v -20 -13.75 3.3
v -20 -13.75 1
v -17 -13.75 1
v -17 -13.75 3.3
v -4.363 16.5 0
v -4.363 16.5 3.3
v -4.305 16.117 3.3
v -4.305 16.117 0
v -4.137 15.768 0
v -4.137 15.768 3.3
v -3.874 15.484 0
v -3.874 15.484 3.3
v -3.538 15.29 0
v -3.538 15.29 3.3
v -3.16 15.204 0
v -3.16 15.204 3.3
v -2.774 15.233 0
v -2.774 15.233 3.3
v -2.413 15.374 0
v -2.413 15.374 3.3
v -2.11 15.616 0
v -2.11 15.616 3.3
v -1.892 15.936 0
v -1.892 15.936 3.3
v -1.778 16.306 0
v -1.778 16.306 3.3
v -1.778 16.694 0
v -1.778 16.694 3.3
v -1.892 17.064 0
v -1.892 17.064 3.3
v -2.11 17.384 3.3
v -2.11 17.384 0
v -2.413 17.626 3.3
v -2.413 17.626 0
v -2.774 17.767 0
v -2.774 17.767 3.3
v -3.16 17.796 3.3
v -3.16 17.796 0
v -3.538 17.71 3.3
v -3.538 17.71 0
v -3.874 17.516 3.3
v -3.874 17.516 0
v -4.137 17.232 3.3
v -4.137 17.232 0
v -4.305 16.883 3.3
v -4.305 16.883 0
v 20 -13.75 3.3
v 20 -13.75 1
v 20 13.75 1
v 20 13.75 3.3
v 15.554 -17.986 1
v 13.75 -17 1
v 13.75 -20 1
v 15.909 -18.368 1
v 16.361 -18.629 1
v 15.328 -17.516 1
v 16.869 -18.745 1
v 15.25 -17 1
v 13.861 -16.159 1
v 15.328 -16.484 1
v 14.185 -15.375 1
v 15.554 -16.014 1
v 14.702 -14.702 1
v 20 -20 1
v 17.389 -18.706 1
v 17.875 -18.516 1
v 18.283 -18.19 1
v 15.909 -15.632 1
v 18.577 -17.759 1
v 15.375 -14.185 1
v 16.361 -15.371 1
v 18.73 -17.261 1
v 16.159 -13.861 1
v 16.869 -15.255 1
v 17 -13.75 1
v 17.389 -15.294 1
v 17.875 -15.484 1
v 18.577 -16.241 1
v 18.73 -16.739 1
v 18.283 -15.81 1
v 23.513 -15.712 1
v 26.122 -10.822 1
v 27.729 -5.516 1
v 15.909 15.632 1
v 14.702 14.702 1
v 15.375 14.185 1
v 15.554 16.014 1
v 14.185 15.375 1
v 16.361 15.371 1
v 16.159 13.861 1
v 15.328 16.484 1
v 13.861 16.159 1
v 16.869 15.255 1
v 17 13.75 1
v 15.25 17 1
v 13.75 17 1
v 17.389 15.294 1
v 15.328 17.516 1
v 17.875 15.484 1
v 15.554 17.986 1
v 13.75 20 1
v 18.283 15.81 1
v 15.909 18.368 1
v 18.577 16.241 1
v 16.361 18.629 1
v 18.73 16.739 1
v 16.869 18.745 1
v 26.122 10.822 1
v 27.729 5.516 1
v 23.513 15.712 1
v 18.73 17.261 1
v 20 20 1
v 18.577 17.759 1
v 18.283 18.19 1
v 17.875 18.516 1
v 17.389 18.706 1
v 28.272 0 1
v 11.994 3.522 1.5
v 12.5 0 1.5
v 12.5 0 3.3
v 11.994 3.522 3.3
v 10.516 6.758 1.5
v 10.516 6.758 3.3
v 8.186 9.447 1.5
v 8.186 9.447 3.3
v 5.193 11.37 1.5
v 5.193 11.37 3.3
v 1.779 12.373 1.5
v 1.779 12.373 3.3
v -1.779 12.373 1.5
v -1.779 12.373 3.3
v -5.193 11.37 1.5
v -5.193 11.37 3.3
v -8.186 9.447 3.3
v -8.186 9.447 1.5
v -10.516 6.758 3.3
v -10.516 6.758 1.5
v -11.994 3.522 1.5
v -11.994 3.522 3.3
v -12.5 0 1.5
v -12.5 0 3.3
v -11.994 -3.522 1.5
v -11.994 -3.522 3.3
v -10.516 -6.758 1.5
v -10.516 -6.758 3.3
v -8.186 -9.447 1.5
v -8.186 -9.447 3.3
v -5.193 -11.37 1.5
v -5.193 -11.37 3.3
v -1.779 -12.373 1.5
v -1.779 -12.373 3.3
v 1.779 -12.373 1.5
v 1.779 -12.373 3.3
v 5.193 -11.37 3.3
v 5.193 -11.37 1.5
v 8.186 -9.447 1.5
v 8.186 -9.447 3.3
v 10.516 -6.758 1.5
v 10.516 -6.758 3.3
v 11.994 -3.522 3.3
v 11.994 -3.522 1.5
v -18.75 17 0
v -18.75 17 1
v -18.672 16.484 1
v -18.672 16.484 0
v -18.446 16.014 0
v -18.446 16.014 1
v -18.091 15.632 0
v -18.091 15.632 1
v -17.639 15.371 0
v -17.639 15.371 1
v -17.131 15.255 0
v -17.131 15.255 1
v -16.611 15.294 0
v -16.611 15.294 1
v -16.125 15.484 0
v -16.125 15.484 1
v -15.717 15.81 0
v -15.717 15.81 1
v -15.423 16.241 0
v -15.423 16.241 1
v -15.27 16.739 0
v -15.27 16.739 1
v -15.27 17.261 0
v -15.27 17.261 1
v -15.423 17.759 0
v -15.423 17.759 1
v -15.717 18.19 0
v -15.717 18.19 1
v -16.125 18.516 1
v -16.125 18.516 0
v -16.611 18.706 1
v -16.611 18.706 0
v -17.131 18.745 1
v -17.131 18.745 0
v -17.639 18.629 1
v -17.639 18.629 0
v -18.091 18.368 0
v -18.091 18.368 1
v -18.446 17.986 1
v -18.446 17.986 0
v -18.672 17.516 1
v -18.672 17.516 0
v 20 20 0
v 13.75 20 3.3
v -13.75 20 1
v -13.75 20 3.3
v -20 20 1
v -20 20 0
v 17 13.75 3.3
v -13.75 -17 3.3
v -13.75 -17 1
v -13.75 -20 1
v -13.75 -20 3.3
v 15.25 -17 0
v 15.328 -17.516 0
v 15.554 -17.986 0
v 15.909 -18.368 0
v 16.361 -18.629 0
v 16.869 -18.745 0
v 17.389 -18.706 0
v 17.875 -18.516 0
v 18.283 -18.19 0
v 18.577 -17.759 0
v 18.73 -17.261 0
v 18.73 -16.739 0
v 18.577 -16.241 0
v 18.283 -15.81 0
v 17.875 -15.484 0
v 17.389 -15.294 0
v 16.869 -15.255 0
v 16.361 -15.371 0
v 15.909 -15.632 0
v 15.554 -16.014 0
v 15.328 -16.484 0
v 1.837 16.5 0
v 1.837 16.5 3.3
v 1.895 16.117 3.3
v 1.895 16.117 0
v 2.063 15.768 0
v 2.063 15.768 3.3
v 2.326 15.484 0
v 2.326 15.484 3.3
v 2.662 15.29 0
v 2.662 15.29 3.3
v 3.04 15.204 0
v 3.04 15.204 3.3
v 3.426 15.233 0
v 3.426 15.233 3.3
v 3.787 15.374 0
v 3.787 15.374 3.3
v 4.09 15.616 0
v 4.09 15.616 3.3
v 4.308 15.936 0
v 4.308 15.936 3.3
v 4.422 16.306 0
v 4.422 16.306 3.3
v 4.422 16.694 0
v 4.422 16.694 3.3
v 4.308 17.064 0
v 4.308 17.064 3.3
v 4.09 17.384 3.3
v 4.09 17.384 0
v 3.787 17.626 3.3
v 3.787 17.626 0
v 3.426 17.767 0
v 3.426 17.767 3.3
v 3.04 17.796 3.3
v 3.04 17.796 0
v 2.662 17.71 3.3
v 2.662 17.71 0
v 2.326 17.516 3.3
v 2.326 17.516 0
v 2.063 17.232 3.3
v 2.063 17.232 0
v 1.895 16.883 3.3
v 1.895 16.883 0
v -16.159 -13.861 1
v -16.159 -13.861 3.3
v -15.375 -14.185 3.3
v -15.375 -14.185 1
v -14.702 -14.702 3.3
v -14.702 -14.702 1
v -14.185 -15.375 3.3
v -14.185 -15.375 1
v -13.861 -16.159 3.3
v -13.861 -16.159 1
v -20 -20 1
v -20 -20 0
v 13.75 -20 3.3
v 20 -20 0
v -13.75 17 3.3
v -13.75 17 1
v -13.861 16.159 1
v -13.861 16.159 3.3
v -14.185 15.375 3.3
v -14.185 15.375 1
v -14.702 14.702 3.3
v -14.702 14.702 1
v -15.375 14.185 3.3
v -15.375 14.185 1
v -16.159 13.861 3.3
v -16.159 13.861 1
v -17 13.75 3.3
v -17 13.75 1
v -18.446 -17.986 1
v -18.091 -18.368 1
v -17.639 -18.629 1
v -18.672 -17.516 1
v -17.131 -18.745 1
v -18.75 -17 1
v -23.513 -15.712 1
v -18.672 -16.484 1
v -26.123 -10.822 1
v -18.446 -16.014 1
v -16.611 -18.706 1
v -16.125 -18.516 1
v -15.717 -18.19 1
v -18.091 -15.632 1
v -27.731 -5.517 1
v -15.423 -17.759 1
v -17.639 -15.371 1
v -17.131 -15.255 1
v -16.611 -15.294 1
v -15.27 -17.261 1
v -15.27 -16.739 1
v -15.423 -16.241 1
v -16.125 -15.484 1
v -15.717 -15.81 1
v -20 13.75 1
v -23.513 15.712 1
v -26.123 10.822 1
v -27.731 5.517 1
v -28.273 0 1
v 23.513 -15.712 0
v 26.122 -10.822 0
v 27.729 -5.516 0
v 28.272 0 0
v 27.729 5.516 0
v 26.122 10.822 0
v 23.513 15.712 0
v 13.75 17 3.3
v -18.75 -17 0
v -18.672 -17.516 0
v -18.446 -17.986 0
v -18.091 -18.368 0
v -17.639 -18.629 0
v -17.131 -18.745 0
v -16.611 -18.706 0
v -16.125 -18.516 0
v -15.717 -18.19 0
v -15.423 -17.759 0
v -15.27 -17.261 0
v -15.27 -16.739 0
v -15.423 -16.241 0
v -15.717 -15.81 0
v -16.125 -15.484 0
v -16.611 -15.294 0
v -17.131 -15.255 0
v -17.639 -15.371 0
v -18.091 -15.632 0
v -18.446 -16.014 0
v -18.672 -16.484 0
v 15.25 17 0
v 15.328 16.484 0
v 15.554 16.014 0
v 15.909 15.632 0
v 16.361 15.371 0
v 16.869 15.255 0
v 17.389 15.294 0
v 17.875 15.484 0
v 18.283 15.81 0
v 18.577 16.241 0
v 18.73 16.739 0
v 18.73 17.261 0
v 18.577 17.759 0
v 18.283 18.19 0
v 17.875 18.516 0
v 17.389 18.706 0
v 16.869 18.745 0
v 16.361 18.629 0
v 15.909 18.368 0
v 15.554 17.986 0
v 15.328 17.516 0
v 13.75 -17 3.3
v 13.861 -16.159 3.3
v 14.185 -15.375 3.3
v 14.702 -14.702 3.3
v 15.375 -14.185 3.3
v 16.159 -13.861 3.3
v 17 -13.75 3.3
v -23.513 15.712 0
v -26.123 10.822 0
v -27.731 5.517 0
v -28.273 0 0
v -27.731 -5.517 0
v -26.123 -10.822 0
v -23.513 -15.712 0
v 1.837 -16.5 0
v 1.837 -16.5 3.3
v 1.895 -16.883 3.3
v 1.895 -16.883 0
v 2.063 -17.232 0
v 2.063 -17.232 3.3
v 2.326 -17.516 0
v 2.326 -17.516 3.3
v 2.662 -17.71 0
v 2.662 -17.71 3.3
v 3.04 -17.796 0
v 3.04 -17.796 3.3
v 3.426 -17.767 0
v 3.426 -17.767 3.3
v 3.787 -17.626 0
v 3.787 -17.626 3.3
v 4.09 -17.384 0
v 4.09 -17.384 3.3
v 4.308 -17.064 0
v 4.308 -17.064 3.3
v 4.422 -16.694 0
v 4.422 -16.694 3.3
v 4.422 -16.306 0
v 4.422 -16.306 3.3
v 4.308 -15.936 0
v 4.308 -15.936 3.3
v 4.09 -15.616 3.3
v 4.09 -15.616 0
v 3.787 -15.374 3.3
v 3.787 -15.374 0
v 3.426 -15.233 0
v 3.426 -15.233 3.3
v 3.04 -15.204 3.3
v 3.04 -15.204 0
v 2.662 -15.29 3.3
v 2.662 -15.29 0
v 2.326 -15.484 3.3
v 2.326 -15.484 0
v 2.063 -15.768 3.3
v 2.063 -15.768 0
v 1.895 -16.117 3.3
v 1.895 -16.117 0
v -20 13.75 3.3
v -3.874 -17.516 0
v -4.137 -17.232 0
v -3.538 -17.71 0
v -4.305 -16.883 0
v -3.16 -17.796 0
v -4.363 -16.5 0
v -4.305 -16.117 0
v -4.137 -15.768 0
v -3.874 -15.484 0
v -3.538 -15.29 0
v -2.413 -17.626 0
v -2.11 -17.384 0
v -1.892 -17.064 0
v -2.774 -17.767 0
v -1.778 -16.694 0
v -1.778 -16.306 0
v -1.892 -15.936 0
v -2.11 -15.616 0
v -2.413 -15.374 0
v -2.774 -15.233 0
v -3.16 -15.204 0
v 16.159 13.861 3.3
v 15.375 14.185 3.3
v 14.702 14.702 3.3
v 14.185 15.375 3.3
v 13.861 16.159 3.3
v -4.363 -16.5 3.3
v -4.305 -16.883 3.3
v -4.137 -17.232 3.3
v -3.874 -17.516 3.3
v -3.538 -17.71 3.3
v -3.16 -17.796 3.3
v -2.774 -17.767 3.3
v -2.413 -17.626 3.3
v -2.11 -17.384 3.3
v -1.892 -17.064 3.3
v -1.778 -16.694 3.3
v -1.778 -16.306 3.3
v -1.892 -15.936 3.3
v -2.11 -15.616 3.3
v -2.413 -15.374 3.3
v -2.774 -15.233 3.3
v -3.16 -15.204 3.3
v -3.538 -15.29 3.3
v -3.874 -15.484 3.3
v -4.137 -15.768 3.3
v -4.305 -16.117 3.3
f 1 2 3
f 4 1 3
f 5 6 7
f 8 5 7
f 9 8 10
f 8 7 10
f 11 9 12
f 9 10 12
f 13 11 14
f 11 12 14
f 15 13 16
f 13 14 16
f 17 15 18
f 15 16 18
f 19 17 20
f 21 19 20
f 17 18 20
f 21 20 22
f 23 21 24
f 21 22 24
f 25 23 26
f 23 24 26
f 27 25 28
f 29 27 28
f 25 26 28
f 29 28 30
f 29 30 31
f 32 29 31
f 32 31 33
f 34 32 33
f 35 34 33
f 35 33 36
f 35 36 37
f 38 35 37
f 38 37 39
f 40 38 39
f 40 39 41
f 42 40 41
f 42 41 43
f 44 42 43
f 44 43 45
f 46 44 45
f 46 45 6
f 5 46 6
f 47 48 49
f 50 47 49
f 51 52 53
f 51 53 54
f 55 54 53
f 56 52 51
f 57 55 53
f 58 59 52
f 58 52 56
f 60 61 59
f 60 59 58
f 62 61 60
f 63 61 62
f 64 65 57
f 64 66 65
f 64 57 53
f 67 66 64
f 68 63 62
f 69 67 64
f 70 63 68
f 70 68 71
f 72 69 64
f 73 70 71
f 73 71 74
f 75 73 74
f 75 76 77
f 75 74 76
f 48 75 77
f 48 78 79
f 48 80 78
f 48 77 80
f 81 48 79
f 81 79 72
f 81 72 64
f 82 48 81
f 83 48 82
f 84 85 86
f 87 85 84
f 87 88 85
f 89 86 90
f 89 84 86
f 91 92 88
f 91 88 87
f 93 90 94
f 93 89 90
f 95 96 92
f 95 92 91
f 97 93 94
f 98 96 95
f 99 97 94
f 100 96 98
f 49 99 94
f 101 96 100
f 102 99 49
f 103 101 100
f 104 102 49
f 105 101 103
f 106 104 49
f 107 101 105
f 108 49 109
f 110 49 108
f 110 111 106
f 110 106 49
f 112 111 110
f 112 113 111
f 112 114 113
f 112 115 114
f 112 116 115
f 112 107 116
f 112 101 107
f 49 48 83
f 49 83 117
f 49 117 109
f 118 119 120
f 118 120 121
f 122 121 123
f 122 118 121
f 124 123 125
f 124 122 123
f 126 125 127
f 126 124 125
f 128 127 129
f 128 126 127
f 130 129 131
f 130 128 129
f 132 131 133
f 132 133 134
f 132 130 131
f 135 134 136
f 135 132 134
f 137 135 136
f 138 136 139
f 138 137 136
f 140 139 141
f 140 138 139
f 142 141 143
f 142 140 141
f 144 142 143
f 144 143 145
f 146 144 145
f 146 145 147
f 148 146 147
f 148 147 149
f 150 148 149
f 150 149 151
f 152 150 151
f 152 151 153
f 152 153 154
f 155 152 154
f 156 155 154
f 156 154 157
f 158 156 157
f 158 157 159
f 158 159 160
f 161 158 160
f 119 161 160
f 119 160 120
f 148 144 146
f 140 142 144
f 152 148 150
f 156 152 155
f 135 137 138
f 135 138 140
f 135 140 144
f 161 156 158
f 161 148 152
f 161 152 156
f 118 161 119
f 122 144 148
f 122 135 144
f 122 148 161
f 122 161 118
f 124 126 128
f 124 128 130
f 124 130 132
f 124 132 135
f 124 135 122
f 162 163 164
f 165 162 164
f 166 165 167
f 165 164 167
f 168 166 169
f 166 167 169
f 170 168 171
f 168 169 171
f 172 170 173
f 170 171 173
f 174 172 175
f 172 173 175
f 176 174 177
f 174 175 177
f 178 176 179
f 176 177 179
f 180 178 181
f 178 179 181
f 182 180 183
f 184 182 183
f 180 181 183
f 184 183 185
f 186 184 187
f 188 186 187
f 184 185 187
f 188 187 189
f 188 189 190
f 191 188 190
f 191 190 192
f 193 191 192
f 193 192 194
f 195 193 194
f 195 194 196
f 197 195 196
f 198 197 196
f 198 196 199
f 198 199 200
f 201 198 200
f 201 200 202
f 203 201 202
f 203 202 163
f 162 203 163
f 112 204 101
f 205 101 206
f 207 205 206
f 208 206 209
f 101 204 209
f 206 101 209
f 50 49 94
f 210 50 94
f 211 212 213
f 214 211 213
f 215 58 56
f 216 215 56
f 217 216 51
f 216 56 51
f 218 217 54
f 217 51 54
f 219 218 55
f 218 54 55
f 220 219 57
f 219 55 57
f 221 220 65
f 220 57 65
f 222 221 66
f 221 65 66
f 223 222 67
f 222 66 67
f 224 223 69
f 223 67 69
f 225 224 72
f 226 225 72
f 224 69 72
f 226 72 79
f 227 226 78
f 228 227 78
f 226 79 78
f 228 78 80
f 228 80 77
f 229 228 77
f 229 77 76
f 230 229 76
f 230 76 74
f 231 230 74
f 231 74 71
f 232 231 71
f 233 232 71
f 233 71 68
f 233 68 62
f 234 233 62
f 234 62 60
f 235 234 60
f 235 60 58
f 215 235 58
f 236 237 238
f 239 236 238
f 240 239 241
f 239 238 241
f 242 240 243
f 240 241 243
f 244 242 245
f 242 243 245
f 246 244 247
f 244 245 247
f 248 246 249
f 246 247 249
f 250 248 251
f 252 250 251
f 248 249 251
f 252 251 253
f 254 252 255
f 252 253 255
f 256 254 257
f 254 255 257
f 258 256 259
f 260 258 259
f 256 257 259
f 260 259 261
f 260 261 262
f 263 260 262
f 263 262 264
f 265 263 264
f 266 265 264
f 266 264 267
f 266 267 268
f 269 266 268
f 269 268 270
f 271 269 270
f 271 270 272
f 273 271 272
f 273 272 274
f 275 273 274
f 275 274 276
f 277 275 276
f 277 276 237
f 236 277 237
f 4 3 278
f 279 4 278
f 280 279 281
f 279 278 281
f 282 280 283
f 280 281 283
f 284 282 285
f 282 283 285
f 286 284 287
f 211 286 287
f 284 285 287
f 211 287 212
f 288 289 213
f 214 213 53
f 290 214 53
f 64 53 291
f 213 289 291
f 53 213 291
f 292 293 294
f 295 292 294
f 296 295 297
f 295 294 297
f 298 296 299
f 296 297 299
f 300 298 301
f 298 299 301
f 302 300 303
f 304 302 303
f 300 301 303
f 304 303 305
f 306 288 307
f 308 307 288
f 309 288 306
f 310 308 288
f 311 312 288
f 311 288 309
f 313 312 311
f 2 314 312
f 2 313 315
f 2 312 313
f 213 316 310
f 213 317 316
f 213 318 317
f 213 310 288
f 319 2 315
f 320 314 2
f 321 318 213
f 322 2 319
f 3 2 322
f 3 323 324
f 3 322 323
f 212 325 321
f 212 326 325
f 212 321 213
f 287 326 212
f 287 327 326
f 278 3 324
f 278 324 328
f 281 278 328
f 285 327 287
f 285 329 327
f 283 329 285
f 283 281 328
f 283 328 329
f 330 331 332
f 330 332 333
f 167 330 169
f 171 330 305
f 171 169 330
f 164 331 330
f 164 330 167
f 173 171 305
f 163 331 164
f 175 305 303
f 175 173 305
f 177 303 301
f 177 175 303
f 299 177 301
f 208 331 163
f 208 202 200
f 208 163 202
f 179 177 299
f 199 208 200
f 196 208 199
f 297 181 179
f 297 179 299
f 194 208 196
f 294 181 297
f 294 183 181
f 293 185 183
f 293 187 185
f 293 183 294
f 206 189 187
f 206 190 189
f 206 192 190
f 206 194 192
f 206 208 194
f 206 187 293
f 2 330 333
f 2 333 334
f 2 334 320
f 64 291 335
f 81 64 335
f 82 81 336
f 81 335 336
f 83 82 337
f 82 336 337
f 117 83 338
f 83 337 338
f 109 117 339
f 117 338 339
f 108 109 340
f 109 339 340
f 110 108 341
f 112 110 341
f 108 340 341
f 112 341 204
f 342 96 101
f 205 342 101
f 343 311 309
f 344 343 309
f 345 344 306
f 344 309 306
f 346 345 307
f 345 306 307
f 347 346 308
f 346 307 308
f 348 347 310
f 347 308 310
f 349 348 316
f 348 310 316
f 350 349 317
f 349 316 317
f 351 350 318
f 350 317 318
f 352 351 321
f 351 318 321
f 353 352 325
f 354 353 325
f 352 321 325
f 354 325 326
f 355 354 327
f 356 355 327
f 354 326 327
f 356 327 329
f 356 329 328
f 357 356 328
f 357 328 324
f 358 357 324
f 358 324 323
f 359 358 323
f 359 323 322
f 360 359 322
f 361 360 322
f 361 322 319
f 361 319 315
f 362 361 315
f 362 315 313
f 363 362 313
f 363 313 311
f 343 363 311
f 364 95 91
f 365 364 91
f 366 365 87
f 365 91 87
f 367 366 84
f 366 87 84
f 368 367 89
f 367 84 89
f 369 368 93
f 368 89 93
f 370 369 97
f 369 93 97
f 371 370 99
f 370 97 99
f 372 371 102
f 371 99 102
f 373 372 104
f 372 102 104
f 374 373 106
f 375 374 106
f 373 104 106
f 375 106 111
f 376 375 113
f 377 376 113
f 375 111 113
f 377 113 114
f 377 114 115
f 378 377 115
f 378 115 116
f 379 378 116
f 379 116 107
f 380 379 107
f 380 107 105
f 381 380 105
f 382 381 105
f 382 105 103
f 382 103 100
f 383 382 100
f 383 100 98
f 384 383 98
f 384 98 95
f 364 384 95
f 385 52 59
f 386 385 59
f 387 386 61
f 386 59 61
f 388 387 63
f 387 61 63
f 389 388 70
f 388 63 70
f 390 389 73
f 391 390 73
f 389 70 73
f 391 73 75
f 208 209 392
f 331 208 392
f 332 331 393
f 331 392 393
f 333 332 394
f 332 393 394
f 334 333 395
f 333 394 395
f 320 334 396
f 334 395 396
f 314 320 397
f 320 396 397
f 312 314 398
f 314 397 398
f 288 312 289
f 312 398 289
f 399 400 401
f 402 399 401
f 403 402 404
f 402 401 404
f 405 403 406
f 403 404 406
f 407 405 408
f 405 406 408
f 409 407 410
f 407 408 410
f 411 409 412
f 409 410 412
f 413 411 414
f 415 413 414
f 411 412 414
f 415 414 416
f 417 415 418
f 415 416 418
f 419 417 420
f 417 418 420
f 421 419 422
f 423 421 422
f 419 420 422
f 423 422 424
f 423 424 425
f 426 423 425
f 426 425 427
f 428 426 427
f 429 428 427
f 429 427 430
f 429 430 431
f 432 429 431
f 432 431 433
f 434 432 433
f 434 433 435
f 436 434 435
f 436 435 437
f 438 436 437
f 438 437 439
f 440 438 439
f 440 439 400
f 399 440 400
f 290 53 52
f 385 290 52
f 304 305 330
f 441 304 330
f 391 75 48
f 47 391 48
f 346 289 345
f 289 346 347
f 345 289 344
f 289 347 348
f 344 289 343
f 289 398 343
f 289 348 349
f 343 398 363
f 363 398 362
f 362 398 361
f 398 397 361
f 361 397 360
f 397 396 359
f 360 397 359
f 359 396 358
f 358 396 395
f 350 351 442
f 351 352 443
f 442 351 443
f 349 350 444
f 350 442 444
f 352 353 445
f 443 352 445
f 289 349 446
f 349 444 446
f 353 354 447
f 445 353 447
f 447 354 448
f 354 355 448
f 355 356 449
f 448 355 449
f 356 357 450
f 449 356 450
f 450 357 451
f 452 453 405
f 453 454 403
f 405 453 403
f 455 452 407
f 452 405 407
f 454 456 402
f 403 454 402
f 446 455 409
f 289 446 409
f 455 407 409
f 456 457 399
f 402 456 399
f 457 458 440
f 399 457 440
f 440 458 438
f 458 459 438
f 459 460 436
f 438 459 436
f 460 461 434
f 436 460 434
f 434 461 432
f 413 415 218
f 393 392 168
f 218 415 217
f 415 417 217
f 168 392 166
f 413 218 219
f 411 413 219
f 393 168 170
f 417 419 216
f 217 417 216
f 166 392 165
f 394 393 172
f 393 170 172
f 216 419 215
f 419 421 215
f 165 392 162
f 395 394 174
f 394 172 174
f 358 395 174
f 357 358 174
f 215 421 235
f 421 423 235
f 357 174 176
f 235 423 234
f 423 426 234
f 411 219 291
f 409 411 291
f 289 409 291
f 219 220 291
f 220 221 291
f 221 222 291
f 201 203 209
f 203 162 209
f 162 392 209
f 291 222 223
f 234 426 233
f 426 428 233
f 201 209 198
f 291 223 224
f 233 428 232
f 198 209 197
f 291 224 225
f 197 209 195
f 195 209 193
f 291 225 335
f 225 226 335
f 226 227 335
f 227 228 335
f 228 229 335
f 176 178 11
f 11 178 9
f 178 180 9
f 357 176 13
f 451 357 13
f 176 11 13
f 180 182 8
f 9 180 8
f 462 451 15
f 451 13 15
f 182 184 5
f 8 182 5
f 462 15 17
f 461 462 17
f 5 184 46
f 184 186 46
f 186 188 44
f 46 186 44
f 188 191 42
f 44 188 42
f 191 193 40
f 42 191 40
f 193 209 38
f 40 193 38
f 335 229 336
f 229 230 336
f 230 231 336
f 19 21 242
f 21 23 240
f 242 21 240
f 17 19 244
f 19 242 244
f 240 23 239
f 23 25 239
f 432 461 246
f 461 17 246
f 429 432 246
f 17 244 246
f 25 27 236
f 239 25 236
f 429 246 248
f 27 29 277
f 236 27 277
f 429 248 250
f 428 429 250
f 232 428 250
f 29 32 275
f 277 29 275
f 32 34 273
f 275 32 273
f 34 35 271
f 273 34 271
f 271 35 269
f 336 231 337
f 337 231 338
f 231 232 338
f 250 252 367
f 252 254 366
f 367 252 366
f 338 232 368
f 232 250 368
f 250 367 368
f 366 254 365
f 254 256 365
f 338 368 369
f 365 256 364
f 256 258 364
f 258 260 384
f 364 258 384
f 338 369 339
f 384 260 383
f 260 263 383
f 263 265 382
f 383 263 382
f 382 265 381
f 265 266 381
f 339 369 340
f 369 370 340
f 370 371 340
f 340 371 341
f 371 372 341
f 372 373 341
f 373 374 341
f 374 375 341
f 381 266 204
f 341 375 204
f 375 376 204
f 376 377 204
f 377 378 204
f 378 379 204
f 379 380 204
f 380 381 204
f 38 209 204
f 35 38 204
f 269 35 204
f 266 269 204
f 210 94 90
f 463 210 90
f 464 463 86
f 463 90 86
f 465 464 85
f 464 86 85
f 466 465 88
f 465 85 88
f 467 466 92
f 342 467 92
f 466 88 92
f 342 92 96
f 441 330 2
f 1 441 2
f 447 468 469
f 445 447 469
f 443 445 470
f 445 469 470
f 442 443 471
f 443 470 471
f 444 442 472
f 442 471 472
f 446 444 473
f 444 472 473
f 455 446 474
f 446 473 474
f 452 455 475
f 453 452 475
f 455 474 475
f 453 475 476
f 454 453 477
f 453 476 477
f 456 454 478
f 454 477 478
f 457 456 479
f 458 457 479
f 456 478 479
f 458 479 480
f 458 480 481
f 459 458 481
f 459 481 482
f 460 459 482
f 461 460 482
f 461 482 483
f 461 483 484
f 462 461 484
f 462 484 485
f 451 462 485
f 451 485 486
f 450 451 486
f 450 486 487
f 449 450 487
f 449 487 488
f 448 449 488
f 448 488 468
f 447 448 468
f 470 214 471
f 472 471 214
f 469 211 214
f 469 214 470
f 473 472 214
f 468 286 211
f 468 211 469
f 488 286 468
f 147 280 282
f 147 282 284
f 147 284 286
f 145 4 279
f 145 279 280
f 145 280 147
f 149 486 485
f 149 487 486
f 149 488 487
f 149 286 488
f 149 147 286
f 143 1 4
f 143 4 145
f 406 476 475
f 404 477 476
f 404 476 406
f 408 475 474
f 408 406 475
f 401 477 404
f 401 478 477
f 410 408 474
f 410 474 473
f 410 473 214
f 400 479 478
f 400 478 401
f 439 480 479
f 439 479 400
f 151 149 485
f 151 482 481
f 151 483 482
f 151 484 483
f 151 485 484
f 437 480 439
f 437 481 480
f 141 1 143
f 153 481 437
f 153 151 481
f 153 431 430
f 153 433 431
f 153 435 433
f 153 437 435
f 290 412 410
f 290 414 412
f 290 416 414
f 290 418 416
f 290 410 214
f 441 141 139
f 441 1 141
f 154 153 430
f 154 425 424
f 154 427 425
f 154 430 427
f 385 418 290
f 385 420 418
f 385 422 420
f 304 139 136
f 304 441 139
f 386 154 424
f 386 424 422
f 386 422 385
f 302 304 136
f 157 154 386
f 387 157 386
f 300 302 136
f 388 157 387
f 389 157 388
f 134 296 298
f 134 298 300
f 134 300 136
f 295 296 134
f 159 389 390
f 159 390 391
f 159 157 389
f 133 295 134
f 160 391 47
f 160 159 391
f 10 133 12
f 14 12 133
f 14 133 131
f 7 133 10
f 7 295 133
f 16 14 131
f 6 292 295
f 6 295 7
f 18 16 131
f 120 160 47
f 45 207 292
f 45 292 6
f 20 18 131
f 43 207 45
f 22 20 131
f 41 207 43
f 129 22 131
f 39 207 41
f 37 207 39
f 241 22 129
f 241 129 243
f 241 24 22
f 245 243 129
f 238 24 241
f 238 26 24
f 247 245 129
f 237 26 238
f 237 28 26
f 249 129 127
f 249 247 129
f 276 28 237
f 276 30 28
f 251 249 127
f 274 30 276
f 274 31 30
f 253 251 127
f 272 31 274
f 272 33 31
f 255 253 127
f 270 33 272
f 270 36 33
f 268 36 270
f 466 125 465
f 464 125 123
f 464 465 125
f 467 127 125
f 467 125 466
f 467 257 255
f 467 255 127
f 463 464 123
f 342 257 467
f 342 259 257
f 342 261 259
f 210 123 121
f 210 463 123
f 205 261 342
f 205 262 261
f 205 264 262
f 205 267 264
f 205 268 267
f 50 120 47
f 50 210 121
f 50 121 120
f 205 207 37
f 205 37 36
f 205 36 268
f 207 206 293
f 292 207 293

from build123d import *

# Parameters (mm, degrees)
F0_R     = 12.5
F1_DEPTH = 3.3
F2_DEPTH = 1.5
F3_DEPTH = 1
F4_D     = 3.5
F5_D     = 2.6


with BuildPart() as f1:
    # F0 (on Top) → F1 (new body)
    with BuildSketch(Plane.XY):
        with BuildLine():
            Line((-13.75, -20), (13.75, -20))
            Line((13.75, -20), (13.75, -17))
            ThreePointArc((13.75, -17), (14.701903, -14.701903), (17, -13.75))
            Line((17, -13.75), (20, -13.75))
            Line((20, -13.75), (20, 13.75))
            Line((20, 13.75), (17, 13.75))
            ThreePointArc((17, 13.75), (14.701903, 14.701903), (13.75, 17))
            Line((13.75, 17), (13.75, 20))
            Line((13.75, 20), (-13.75, 20))
            Line((-13.75, 20), (-13.75, 17))
            ThreePointArc((-13.75, 17), (-14.701903, 14.701903), (-17, 13.75))
            Line((-17, 13.75), (-20, 13.75))
            Line((-20, 13.75), (-20, -13.75))
            Line((-20, -13.75), (-17, -13.75))
            ThreePointArc((-17, -13.75), (-14.701903, -14.701903), (-13.75, -17))
            Line((-13.75, -17), (-13.75, -20))
        make_face()
        Circle(F0_R, mode=Mode.SUBTRACT)
    extrude(amount=F1_DEPTH)

    # F0 (on Top) → F2 (join)
    with BuildSketch(Plane.XY):
        Circle(F0_R)
    extrude(amount=F2_DEPTH)

    # F0 (on Top) → F3 (join)
    with BuildSketch(Plane.XY):
        with BuildLine():
            Line((20, -13.75), (20, -20))
            ThreePointArc((20, -20), (28.271859, 0), (20, 20))
            Line((20, 20), (20, 13.75))
            Line((20, 13.75), (20, -13.75))
        make_face()
        with BuildLine():
            Line((20, 13.75), (20, 20))
            Line((20, 20), (13.75, 20))
            Line((13.75, 20), (13.75, 17))
            ThreePointArc((13.75, 17), (14.701903, 14.701903), (17, 13.75))
            Line((17, 13.75), (20, 13.75))
        make_face()
        with BuildLine():
            Line((13.75, -20), (20, -20))
            Line((20, -20), (20, -13.75))
            Line((20, -13.75), (17, -13.75))
            ThreePointArc((17, -13.75), (14.701903, -14.701903), (13.75, -17))
            Line((13.75, -17), (13.75, -20))
        make_face()
        with BuildLine():
            Line((-13.75, 17), (-13.75, 20))
            Line((-13.75, 20), (-20, 20))
            Line((-20, 20), (-20, 13.75))
            Line((-20, 13.75), (-17, 13.75))
            ThreePointArc((-17, 13.75), (-14.701903, 14.701903), (-13.75, 17))
        make_face()
        with BuildLine():
            ThreePointArc((-20, 20), (-28.273493, 0), (-20, -20))
            Line((-20, -20), (-20, -13.75))
            Line((-20, -13.75), (-20, 13.75))
            Line((-20, 13.75), (-20, 20))
        make_face()
        with BuildLine():
            Line((-20, -20), (-13.75, -20))
            Line((-13.75, -20), (-13.75, -17))
            ThreePointArc((-13.75, -17), (-14.701903, -14.701903), (-17, -13.75))
            Line((-17, -13.75), (-20, -13.75))
            Line((-20, -13.75), (-20, -20))
        make_face()
    extrude(amount=F3_DEPTH)

    # F4 (through all)
    with Locations(Plane(origin=(0, 0, 0), x_dir=(1, 0, 0), z_dir=(0, 0, -1))):
        with Locations((17, 17), (-17, 17), (-17, -17), (17, -17)):
            Hole(F4_D / 2)

    # F5 (through all)
    with Locations(Plane(origin=(0, 0, 0), x_dir=(1, 0, 0), z_dir=(0, 0, -1))):
        with Locations((-3.063159, 16.5), (3.136841, 16.5), (3.136841, -16.5), (-3.063159, -16.5)):
            Hole(F5_D / 2)


solid = f1.part
